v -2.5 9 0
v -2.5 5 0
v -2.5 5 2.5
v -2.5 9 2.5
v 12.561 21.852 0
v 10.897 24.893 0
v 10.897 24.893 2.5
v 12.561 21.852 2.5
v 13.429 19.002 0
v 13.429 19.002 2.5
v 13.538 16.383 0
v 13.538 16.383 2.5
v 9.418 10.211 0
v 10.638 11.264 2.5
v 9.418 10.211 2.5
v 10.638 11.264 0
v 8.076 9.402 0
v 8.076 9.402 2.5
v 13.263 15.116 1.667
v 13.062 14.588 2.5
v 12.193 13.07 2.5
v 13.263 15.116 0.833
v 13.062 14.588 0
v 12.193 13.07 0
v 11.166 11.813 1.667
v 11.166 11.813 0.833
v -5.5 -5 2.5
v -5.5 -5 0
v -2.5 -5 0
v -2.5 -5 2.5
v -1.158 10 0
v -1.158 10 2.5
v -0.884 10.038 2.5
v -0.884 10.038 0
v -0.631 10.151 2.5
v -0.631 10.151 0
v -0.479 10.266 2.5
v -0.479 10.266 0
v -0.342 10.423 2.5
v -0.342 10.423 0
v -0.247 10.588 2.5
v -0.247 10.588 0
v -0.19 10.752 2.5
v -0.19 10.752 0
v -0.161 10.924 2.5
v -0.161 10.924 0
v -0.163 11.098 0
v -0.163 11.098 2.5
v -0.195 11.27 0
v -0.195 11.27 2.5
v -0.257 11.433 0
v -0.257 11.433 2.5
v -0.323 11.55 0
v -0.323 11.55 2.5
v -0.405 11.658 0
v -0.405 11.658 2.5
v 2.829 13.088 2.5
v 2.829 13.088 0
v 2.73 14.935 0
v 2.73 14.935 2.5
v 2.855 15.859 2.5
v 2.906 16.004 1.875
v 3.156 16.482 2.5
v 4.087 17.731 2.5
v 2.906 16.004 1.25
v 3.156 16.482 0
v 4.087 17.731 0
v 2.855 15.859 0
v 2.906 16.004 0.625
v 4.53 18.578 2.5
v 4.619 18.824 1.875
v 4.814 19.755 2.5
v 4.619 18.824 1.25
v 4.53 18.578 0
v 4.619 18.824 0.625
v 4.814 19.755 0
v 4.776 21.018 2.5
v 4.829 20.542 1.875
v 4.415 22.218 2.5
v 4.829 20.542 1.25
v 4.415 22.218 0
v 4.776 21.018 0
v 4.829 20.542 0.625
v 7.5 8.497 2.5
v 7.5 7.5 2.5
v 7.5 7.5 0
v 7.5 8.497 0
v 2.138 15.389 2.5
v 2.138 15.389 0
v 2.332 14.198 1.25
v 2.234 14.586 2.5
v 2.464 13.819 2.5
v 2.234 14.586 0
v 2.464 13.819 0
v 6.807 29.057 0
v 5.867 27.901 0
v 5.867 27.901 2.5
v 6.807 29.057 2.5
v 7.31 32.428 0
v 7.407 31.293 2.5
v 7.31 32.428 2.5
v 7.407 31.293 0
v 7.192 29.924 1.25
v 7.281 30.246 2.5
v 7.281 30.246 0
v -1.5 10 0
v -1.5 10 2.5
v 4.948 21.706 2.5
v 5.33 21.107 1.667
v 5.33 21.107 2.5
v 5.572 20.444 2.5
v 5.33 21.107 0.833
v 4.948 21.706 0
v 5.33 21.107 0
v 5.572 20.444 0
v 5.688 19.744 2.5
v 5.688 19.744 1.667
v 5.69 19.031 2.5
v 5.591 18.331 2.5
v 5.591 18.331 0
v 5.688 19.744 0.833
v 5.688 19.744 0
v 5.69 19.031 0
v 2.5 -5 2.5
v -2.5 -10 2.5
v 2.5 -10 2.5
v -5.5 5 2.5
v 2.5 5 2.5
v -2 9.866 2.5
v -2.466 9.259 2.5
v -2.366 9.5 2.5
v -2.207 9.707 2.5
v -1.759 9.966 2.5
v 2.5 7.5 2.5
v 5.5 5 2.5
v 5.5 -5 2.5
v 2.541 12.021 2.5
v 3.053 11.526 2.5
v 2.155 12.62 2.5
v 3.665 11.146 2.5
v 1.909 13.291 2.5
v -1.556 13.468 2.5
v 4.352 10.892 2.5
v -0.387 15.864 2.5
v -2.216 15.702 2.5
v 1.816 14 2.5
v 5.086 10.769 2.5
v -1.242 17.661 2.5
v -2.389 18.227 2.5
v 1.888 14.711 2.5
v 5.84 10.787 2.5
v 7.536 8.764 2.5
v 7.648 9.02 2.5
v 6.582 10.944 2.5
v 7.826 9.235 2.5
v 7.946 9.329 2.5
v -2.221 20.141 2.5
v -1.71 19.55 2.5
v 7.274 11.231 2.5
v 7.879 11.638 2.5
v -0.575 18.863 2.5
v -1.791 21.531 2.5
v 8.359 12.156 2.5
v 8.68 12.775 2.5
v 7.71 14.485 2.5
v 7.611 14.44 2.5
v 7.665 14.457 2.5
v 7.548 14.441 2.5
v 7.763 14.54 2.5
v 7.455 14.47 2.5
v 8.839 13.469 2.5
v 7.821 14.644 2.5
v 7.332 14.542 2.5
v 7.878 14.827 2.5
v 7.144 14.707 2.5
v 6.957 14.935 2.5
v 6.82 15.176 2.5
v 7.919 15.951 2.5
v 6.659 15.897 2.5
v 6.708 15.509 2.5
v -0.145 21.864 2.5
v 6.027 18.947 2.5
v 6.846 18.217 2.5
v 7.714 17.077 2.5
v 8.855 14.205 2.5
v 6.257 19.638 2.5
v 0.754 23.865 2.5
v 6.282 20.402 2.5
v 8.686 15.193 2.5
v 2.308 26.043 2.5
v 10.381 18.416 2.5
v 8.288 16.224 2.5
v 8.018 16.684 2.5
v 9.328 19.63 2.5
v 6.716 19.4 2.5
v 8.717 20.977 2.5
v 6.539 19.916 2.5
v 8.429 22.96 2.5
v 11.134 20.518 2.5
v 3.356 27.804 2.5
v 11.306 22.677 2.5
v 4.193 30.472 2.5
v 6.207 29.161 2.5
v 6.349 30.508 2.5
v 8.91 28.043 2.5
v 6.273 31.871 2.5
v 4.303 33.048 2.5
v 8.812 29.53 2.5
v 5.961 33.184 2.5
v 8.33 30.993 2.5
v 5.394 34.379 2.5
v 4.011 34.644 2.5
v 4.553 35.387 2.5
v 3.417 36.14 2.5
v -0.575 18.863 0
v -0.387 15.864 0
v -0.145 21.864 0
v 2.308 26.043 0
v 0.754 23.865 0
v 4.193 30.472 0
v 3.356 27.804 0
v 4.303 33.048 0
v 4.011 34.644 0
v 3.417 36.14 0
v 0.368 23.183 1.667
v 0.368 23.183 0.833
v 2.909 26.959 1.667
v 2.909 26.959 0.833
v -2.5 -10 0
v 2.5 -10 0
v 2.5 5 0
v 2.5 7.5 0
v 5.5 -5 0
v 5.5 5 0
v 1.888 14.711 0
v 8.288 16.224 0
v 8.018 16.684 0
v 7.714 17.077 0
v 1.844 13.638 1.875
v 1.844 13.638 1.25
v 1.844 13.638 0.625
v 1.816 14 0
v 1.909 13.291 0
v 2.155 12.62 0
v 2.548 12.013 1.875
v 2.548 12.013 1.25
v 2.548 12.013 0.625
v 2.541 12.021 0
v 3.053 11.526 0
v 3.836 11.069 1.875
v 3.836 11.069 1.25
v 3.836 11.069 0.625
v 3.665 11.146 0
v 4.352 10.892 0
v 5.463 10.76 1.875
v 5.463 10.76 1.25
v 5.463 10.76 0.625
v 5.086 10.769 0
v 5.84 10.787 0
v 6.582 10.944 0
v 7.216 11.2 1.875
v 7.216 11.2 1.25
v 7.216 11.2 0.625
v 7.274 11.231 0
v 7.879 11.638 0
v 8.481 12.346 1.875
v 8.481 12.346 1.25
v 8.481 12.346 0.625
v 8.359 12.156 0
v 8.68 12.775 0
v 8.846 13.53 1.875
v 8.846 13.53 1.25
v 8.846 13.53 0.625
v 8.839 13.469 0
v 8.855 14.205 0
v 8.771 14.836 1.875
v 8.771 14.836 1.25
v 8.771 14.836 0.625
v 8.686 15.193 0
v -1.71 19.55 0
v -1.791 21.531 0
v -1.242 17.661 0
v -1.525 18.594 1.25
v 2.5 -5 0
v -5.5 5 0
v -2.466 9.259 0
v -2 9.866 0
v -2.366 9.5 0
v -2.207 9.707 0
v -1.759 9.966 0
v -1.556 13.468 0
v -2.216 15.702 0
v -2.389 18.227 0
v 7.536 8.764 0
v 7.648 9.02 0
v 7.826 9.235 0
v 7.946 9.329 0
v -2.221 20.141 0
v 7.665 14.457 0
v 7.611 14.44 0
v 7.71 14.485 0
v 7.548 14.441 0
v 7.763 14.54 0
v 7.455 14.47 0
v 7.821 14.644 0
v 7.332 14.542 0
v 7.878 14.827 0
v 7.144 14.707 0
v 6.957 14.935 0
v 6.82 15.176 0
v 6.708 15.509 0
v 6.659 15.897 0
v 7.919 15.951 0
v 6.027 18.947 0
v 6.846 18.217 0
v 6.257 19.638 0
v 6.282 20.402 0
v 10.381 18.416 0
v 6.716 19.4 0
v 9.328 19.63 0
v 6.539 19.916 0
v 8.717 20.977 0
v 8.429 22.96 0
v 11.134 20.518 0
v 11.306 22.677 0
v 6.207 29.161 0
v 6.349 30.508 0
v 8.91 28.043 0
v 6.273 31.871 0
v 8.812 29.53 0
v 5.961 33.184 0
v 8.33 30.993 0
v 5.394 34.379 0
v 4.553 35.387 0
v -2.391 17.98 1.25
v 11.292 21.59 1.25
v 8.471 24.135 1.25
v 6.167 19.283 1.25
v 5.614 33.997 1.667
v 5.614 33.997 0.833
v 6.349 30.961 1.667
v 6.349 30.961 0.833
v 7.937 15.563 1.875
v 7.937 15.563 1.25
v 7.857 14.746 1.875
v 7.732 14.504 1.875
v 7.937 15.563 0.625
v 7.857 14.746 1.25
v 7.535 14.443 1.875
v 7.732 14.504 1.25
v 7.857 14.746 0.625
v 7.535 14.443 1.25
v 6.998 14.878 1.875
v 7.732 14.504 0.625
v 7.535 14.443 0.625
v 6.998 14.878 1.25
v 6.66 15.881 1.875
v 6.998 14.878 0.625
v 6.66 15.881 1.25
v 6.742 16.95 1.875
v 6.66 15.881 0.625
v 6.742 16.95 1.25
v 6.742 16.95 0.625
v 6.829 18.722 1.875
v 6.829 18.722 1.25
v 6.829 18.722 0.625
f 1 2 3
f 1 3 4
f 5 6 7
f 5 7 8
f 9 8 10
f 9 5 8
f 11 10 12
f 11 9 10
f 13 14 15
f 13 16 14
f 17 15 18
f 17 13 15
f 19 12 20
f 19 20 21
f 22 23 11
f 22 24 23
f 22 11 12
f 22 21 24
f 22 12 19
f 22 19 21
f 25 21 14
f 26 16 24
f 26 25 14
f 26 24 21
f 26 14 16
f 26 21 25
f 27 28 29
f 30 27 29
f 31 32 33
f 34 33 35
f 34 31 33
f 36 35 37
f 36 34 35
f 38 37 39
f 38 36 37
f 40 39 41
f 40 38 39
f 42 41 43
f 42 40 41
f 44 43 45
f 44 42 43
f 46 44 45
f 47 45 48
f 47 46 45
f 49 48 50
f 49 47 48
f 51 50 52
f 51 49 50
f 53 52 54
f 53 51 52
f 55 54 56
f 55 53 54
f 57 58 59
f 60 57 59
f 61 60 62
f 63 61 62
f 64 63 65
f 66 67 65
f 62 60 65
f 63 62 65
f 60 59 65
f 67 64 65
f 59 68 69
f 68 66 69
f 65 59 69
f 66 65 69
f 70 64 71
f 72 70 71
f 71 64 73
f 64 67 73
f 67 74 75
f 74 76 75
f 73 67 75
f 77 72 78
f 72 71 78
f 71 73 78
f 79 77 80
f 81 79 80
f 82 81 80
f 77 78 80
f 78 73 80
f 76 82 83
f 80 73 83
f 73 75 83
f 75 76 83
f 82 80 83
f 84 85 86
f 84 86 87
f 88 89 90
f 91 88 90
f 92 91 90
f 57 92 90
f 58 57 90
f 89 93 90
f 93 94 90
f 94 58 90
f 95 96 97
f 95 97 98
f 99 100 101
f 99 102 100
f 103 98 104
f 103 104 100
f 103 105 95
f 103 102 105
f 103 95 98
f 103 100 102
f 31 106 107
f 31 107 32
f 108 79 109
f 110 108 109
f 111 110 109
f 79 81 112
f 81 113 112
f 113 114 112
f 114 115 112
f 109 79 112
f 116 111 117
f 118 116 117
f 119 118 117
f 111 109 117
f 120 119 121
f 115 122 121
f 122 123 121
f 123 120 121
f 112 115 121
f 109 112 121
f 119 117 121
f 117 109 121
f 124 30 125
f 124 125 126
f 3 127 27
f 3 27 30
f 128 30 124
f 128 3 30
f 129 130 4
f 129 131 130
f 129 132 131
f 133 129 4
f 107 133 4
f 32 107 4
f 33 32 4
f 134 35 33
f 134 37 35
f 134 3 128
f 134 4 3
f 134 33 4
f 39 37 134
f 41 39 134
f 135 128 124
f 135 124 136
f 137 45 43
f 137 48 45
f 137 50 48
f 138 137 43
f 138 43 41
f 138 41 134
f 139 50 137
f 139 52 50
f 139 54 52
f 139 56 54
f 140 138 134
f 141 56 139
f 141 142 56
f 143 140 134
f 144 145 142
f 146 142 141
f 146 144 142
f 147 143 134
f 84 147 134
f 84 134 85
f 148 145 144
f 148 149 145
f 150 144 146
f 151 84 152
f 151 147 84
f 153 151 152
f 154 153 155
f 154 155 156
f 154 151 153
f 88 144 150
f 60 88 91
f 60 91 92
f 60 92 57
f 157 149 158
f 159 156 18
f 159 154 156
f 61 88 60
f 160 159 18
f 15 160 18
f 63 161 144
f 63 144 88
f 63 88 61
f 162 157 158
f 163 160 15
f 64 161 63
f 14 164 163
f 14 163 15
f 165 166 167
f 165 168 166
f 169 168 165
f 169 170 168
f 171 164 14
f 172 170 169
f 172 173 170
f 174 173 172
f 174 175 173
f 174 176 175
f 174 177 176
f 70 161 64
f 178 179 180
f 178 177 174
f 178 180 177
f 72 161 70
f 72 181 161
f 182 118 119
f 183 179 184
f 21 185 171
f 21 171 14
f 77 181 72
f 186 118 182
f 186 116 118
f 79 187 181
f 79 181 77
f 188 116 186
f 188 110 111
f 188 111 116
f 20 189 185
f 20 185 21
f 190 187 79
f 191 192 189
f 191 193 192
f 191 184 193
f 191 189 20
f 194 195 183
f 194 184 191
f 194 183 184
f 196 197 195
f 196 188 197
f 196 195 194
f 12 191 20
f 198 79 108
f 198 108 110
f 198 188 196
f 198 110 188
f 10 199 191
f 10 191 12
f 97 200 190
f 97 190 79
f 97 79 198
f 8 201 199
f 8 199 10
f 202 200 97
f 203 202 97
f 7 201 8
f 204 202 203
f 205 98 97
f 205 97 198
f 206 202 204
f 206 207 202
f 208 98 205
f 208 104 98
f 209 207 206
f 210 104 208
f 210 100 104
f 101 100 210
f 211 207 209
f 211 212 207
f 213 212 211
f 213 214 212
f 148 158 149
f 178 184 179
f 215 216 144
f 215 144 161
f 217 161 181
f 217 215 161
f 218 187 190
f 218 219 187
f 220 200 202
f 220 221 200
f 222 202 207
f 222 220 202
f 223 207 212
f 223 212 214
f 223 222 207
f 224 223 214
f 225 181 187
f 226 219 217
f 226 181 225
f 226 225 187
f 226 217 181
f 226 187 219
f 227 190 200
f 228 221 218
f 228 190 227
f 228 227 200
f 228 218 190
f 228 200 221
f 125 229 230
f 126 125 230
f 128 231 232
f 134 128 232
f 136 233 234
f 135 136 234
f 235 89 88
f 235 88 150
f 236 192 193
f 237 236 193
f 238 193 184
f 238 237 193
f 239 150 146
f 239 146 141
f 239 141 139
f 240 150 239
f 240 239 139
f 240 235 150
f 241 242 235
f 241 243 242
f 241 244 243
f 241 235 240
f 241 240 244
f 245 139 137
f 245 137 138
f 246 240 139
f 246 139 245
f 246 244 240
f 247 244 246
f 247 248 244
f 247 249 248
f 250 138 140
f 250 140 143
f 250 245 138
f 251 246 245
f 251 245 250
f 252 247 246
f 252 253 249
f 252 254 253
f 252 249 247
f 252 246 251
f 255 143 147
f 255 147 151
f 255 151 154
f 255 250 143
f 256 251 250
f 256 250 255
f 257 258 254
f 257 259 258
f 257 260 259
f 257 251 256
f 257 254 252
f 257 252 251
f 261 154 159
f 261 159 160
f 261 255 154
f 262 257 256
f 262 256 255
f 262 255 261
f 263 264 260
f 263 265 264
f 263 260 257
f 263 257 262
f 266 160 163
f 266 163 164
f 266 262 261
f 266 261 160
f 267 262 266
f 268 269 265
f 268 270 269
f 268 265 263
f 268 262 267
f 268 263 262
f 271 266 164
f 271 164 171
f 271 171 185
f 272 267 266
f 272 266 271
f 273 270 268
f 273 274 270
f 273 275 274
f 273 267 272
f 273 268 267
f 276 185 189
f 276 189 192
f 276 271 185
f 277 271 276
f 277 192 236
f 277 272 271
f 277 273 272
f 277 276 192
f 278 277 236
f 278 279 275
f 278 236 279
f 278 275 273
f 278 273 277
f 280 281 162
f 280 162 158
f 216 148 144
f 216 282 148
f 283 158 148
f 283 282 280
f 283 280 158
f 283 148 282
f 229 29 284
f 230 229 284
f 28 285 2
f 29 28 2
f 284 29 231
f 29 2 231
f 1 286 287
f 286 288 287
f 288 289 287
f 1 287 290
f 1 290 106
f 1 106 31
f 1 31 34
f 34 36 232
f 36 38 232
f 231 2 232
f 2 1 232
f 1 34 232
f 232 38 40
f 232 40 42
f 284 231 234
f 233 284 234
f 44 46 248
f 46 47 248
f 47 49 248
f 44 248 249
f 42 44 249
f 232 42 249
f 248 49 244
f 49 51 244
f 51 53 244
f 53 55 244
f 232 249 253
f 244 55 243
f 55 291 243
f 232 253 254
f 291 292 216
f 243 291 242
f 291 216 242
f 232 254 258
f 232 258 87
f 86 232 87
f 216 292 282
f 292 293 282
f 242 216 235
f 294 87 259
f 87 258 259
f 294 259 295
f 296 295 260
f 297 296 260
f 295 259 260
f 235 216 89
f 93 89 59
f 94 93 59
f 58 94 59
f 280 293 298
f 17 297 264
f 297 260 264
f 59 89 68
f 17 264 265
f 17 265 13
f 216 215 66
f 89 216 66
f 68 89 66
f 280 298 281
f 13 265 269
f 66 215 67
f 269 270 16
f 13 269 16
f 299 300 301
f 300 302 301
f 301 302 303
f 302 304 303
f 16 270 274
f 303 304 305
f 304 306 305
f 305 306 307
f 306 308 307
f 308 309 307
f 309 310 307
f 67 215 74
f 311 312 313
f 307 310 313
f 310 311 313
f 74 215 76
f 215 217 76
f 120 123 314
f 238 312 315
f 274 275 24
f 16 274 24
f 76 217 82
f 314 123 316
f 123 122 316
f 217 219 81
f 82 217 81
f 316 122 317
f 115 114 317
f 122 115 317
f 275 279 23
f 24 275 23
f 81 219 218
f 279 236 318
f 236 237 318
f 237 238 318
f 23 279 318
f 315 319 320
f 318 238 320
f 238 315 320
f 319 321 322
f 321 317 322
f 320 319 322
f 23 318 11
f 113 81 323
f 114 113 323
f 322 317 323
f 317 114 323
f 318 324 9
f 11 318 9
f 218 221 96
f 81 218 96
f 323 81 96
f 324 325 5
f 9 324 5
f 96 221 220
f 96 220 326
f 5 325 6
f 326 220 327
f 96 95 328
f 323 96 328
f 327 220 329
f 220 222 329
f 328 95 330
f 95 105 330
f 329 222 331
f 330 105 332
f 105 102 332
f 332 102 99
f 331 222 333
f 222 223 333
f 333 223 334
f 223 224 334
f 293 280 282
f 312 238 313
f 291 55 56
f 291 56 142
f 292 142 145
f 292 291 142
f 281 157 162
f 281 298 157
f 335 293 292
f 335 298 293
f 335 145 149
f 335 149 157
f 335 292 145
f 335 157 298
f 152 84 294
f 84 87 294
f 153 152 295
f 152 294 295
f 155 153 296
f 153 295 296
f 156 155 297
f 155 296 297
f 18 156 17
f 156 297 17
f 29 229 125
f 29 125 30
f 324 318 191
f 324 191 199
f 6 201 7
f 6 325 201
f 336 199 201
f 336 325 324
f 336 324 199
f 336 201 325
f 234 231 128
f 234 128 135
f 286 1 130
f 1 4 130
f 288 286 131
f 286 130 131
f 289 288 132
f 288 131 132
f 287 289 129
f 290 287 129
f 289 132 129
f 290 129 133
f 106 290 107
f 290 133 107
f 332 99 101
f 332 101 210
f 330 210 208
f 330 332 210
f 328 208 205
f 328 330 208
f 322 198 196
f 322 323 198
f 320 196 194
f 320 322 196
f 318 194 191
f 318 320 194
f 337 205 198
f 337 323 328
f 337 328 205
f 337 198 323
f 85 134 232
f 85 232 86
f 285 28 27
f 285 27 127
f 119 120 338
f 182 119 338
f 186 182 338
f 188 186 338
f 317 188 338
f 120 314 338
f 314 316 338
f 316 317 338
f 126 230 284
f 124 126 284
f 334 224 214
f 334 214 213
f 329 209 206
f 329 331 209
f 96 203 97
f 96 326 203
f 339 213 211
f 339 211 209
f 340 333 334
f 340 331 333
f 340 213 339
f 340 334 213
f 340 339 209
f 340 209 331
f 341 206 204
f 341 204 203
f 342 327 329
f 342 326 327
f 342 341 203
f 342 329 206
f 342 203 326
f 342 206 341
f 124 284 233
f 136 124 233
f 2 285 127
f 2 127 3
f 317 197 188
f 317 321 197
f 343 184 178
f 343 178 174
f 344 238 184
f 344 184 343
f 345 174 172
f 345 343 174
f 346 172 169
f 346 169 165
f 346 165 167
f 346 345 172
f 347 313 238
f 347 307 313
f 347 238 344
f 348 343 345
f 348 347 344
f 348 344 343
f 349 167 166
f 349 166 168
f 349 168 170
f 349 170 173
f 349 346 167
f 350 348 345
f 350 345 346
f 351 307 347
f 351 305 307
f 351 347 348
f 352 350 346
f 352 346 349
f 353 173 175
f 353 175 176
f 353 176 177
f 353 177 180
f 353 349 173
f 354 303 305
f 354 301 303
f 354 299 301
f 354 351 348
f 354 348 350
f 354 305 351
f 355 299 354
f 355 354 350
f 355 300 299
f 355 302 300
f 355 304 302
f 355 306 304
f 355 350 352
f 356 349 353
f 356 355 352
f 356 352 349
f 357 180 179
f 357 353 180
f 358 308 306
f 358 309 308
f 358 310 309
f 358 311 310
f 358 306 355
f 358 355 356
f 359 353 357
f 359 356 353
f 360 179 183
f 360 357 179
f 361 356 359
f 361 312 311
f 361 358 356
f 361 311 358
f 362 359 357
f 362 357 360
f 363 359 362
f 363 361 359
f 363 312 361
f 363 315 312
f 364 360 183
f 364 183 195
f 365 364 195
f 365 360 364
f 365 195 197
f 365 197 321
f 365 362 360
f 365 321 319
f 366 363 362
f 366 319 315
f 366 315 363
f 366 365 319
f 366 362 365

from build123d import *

# Parameters (mm, degrees)
SKETCH_1_W      = 3
SKETCH_1_H      = 10
SKETCH_1_W_2    = 5
SKETCH_1_H_2    = 20
EXTRUDE_1_DEPTH = 2.5
SKETCH_2_W      = 5
SKETCH_2_H      = 2.5
EXTRUDE_3_DEPTH = 2.5
EXTRUDE_4_DEPTH = 2.5
FILLET_1_R      = 1


with BuildPart() as part:
    # 草图1 → 凸台-拉伸1 (new body)
    with BuildSketch(Plane.XY):
        with Locations((-4, 0)):
            Rectangle(SKETCH_1_W, SKETCH_1_H)
        Rectangle(SKETCH_1_W_2, SKETCH_1_H_2)
        with Locations((4, 0)):
            Rectangle(SKETCH_1_W, SKETCH_1_H)
    extrude(amount=EXTRUDE_1_DEPTH)

    # 草图2 → 凸台-拉伸3 (add)
    with BuildSketch(Plane.XY.offset(2.5)):
        with Locations((5, 8.75)):
            Rectangle(SKETCH_2_W, SKETCH_2_H)
    extrude(amount=-EXTRUDE_3_DEPTH)

    # 草图3 → 凸台-拉伸4 (add)
    with BuildSketch(Plane.XY):
        with BuildLine():
            add(Edge.make_bspline(
                [(2.909166473, 9.462916852), (-2.415095275, 11.413939745), (-2.382729554, 20.340359213), (-1.791159912, 21.531322434)],
                knots=[0, 0, 0, 0.735562892, 1, 1, 1], degree=2))
            add(Edge.make_bspline(
                [(-1.791159912, 21.531322434), (-1.960201232, 18.490050647), (-0.386815041, 15.86404983)],
                knots=[0, 0, 0, 1, 1, 1], degree=2))
            add(Edge.make_bspline(
                [(-0.386815041, 15.86404983), (-0.710711682, 18.231758312), (-0.730459832, 22.706300044), (4.366438343, 27.931127178), (4.877324626, 33.357459928), (3.417309866, 36.140444981)],
                knots=[0, 0, 0, 0, 0.347000482, 0.559930801, 1, 1, 1, 1], degree=3))
            add(Edge.make_bspline(
                [(3.417309866, 36.140444981), (6.425369509, 34.731785706), (6.875869697, 30.683717346), (5.867418917, 27.90080749)],
                knots=[0, 0, 0, 0, 1, 1, 1, 1], degree=3))
            add(Edge.make_bspline(
                [(5.867418917, 27.90080749), (7.795793944, 29.684649261), (7.309638514, 32.427774559)],
                knots=[0, 0, 0, 1, 1, 1], degree=2))
            add(Edge.make_bspline(
                [(7.309638514, 32.427774559), (9.799469138, 29.791682599), (7.925287293, 24.979549302), (8.569671496, 19.9896001), (10.380756945, 18.41594542)],
                knots=[0, 0, 0, 0, 0.581503319, 1, 1, 1, 1], degree=3))
            add(Edge.make_bspline(
                [(10.380756945, 18.41594542), (11.946226348, 21.526199715), (10.896788229, 24.893496012)],
                knots=[0, 0, 0, 1, 1, 1], degree=2))
            add(Edge.make_bspline(
                [(10.896788229, 24.893496012), (12.64972713, 22.353469832), (14.94688254, 16.787009136), (10.238202027, 10.257823069), (6.399430517, 7.87311155), (2.909166473, 9.462916852)],
                knots=[0, 0, 0, 0, 0.442622305, 0.610975298, 1, 1, 1, 1], degree=3))
        make_face()
        with BuildLine():
            add(Edge.make_bspline(
                [(2.138293561, 15.389413184), (1.565216395, 14.302849067), (1.989570498, 11.703647244), (5.522471535, 10.241080078), (9.730791334, 12.237177784), (8.68425822, 15.991930054), (7.71397605, 17.077463845)],
                knots=[0, 0, 0, 0, 0.234608912, 0.444601304, 0.670183477, 1, 1, 1, 1], degree=3))
            add(Edge.make_bspline(
                [(7.71397605, 17.077463845), (7.917206002, 16.676345138), (8.228664484, 13.713534992), (6.488750006, 15.261680135), (6.855872826, 17.479461539), (6.969976099, 19.315575439), (6.28169064, 20.402412119)],
                knots=[0, 0, 0, 0, 0.298390972, 0.375084696, 0.606753796, 1, 1, 1, 1], degree=3))
            add(Edge.make_bspline(
                [(5.59112446, 18.330713579), (6.398305864, 19.200286486), (6.28169064, 20.402412119)],
                knots=[0, 0, 0, 1, 1, 1], degree=2))
            add(Edge.make_bspline(
                [(4.414604302, 22.218345406), (5.643418978, 21.298941546), (5.879978633, 19.703315032), (5.59112446, 18.330713579)],
                knots=[0, 0, 0, 0, 1, 1, 1, 1], degree=3))
            add(Edge.make_bspline(
                [(2.828859741, 13.087525918), (2.828226763, 13.997455917), (2.393895179, 15.836493753), (3.947689734, 17.386184776), (5.014150899, 19.389667091), (4.889086339, 21.178881355), (4.414604302, 22.218345406)],
                knots=[0, 0, 0, 0, 0.302041838, 0.493836745, 0.643329375, 1, 1, 1, 1], degree=3))
            add(Edge.make_bspline(
                [(2.138293561, 15.389413184), (2.181401854, 14.156825875), (2.828859741, 13.087525918)],
                knots=[0, 0, 0, 1, 1, 1], degree=2))
        make_face(mode=Mode.SUBTRACT)
    extrude(amount=EXTRUDE_4_DEPTH)

    # 圆角1
    fillet_1_edges = [part.edges().sort_by_distance(p)[0] for p in [
        (-2.5, 10, 1.25),
        (1.70390459, 10, 1.25),
        (7.5, 9.165481652, 1.25),
    ]]
    fillet(fillet_1_edges, radius=FILLET_1_R)


solid = part.part
